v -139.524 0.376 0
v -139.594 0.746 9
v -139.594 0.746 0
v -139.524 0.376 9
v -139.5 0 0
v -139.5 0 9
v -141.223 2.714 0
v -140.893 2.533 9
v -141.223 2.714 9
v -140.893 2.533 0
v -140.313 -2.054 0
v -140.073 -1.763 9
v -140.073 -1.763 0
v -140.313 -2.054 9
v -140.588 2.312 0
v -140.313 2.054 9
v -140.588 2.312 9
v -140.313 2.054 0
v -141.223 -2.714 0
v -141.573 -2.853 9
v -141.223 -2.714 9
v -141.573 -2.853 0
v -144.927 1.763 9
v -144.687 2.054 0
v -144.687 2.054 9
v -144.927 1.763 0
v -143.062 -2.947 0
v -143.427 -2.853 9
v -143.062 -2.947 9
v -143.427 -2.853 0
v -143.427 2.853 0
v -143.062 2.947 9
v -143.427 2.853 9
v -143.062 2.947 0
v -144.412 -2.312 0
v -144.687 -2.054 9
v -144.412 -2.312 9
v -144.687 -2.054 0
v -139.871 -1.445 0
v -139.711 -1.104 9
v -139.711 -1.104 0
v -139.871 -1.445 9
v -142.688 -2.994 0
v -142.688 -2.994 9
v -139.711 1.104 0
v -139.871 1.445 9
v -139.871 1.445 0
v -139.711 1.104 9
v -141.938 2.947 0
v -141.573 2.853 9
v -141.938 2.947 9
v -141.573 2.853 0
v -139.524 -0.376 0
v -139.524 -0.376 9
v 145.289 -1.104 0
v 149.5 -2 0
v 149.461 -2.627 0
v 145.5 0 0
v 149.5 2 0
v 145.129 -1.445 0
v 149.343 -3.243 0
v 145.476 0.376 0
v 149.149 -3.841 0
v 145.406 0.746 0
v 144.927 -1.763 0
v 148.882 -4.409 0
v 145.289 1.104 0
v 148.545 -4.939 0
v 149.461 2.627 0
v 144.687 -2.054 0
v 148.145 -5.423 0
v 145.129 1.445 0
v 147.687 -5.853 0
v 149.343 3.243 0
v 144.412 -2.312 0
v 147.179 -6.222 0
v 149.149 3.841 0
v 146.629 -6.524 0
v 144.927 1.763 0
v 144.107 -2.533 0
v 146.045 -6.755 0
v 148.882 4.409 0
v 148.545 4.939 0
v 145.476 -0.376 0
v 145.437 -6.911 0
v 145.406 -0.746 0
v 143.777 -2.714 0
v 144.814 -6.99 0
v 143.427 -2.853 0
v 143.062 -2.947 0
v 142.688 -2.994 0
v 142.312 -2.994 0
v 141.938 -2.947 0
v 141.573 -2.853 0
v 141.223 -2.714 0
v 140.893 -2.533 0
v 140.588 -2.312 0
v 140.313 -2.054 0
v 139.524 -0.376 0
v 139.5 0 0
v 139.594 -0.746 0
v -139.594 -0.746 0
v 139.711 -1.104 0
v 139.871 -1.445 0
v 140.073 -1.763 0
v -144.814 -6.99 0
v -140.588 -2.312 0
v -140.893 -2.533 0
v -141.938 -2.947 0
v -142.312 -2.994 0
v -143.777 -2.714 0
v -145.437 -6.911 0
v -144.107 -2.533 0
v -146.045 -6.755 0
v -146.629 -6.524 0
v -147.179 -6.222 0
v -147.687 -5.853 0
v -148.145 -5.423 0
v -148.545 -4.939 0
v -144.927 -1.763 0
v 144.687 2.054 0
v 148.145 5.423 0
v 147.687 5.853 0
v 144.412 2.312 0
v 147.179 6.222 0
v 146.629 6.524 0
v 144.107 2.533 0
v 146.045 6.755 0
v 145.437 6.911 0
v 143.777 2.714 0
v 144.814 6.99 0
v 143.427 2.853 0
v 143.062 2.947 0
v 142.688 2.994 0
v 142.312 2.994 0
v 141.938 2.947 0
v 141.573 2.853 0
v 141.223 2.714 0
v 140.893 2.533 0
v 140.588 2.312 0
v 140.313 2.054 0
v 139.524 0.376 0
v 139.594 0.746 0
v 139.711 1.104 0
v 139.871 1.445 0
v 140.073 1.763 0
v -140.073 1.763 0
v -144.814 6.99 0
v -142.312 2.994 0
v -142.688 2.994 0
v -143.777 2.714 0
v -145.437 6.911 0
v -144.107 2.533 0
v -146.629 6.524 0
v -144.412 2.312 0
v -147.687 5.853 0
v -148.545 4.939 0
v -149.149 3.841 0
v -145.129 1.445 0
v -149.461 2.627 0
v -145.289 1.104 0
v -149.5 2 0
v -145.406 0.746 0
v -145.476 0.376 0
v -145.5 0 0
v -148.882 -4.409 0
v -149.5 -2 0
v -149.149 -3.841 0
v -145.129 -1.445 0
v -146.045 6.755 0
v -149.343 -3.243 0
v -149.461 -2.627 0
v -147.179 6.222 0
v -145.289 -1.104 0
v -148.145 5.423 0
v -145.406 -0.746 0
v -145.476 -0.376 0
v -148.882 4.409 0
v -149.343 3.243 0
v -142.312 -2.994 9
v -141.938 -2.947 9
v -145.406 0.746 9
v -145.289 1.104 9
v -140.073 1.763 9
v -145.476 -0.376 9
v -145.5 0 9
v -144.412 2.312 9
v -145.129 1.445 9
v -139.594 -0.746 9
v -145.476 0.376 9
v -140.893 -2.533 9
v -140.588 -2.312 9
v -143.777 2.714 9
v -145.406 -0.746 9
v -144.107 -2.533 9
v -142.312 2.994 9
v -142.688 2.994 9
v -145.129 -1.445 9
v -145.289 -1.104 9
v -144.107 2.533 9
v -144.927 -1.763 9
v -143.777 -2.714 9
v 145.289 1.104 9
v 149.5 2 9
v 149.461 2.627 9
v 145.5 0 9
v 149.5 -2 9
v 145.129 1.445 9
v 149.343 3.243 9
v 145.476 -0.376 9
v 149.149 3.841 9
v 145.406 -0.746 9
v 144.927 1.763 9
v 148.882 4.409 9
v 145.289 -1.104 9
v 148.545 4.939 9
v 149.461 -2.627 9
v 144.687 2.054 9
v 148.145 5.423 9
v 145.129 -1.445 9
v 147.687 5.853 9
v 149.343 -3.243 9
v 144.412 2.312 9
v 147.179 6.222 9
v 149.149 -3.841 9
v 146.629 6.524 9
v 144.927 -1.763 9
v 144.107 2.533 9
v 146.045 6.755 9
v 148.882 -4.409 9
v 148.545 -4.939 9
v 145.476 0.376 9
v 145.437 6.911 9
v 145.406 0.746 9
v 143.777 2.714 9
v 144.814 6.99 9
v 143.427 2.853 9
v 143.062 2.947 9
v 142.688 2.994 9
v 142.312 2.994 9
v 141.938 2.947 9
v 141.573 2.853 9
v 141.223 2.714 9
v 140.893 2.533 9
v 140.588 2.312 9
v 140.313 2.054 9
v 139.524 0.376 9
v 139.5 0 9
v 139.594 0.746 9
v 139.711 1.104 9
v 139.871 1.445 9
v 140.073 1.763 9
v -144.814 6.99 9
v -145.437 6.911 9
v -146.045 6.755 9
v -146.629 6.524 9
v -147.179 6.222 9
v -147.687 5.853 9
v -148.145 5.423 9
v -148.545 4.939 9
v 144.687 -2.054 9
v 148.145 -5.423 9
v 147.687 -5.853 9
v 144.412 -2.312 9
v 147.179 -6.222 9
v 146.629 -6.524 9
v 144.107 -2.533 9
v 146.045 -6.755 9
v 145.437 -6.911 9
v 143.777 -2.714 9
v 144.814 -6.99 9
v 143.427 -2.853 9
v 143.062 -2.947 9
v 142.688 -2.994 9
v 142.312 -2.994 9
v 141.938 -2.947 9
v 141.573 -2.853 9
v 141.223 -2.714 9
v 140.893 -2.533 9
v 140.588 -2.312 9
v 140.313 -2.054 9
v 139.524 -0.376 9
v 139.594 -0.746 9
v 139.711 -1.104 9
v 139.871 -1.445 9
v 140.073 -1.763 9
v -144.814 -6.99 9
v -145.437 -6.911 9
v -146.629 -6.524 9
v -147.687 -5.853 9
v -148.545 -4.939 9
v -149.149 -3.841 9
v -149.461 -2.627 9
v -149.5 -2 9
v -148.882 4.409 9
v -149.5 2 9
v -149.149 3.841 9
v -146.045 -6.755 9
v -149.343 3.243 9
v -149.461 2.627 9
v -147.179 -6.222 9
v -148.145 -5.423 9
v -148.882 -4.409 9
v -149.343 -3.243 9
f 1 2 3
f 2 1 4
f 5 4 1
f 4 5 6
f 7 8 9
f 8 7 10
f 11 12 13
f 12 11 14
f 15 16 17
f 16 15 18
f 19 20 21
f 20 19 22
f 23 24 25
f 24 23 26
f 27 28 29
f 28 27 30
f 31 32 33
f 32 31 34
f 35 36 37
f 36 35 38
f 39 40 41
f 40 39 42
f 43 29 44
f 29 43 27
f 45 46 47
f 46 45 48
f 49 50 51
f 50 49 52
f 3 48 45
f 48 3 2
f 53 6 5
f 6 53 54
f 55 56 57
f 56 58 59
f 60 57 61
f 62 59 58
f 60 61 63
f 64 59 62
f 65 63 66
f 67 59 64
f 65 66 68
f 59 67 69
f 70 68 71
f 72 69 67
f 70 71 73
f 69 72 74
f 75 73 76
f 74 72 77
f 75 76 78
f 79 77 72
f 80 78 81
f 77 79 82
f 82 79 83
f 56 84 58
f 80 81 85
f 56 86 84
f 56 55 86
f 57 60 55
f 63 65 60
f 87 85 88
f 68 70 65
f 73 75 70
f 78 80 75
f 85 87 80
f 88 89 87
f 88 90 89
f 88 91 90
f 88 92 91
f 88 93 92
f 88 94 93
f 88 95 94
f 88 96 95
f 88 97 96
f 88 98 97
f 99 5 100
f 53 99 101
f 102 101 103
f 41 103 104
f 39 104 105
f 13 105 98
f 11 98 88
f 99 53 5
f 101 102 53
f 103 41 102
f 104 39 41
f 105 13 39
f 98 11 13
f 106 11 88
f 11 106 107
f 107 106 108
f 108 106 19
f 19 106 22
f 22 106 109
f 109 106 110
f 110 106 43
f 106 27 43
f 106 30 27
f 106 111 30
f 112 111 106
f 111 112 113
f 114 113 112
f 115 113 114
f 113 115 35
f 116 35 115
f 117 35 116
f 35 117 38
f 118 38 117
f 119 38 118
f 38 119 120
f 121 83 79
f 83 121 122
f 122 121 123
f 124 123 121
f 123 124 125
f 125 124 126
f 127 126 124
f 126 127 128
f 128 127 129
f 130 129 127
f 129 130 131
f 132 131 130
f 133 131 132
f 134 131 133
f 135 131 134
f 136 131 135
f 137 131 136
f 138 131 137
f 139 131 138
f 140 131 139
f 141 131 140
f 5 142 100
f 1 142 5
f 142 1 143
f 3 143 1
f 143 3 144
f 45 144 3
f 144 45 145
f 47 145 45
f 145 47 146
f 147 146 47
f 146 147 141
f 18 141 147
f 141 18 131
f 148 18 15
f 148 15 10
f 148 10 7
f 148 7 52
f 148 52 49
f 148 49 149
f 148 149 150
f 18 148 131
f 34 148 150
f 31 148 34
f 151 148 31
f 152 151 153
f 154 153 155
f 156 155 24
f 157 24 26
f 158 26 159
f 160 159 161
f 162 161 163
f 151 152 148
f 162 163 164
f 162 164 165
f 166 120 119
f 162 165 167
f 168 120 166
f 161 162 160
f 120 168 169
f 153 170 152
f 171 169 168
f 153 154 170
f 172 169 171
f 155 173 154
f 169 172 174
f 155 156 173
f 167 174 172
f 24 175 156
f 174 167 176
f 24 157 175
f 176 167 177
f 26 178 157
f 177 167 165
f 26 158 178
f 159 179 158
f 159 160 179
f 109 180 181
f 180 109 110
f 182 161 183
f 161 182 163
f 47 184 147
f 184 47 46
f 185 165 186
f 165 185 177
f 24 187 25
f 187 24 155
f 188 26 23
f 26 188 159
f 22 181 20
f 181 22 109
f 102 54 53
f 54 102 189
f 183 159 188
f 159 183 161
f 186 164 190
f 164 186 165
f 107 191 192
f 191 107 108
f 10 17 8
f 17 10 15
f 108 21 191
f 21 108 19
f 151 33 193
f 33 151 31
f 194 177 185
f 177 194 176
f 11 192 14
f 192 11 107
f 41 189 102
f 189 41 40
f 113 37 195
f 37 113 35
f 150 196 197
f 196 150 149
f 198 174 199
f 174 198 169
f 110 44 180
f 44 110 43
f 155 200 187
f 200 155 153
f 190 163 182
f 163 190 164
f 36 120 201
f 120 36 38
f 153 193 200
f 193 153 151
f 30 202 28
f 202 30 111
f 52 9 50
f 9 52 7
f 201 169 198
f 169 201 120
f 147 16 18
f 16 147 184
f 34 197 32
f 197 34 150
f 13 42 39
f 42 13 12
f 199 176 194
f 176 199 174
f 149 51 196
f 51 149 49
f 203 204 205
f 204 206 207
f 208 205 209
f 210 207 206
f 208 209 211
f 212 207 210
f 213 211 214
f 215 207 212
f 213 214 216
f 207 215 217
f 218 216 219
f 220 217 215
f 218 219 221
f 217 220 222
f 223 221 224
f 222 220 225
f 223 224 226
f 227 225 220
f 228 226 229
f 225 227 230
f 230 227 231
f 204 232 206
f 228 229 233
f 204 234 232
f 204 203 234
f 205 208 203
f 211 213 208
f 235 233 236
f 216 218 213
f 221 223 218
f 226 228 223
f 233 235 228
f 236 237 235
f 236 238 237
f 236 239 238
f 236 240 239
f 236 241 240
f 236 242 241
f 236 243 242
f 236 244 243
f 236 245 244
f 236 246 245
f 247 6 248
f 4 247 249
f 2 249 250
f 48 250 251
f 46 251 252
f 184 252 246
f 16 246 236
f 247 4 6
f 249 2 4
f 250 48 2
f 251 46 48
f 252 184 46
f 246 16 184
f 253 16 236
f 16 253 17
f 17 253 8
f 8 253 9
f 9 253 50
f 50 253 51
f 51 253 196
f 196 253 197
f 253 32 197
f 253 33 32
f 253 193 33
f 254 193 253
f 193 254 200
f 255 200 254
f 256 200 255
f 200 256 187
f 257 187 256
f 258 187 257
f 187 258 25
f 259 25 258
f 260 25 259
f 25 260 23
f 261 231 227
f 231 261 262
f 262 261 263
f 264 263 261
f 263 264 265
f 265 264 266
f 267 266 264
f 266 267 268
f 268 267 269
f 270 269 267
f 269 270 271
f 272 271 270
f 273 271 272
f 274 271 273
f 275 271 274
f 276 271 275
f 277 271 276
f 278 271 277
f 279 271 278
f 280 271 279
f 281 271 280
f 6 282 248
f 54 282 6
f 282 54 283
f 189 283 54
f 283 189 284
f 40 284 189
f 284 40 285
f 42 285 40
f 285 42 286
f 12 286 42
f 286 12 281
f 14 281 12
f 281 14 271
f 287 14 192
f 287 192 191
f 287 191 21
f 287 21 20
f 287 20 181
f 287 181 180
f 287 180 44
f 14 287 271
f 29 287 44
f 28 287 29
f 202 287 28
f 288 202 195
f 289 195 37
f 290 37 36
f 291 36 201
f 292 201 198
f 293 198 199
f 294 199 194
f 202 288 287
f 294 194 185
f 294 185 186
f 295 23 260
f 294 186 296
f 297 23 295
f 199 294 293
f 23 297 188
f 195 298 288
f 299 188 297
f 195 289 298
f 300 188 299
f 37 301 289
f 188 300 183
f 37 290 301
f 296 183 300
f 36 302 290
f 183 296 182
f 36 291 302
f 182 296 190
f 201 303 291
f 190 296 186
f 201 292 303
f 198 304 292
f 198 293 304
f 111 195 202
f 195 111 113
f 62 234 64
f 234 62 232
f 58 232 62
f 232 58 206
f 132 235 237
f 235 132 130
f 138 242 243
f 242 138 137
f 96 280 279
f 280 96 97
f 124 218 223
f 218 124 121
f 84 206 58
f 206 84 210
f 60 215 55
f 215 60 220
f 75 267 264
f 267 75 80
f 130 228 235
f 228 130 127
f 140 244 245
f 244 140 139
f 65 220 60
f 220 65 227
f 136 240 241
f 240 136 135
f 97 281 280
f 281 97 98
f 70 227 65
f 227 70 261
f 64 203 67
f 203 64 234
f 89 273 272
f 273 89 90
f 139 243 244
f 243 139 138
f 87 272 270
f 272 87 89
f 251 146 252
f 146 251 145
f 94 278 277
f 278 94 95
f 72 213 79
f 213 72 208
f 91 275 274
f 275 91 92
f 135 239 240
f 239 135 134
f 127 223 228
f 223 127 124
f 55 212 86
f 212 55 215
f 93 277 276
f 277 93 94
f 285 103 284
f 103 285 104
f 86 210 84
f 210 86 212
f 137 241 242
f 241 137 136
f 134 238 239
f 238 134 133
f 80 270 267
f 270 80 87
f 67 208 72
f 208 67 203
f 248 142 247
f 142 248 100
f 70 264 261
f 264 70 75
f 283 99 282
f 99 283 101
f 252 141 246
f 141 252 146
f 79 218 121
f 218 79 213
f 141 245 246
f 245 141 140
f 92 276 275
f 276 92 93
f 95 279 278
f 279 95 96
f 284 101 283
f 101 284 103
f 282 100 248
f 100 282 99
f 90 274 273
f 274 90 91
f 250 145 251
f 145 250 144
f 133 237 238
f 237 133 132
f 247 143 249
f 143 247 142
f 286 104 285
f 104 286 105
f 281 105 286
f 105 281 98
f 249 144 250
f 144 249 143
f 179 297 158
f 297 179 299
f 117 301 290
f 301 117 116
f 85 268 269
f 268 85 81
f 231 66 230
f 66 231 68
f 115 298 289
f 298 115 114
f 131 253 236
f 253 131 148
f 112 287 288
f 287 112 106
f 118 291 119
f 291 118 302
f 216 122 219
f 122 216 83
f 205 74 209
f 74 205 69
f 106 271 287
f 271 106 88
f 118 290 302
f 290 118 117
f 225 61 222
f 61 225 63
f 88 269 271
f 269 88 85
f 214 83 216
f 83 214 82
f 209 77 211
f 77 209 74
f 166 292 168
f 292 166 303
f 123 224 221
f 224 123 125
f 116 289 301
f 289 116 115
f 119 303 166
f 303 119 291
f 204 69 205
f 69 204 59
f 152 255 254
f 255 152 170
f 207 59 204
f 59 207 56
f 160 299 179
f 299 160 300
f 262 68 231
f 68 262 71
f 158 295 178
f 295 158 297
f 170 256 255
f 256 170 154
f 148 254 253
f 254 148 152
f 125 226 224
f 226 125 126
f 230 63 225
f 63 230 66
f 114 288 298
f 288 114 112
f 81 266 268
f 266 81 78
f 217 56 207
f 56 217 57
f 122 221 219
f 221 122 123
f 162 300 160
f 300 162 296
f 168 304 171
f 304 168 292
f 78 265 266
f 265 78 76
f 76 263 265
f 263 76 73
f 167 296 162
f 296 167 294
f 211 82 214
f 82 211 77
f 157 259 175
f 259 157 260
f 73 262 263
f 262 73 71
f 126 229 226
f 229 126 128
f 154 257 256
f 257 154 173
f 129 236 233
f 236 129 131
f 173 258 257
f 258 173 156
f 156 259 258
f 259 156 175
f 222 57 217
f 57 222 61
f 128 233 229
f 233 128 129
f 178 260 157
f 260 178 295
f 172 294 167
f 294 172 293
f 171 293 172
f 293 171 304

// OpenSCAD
$fn = 50;


difference() {
	union() {
		hull() {
			translate(v = [-144.5000000000, 2.0000000000, 0]) {
				cylinder(h = 9, r = 5);
			}
			translate(v = [144.5000000000, 2.0000000000, 0]) {
				cylinder(h = 9, r = 5);
			}
			translate(v = [-144.5000000000, -2.0000000000, 0]) {
				cylinder(h = 9, r = 5);
			}
			translate(v = [144.5000000000, -2.0000000000, 0]) {
				cylinder(h = 9, r = 5);
			}
		}
	}
	union() {
		translate(v = [-142.5000000000, 0.0000000000, 0]) {
			cylinder(h = 9, r = 3.0000000000);
		}
		translate(v = [142.5000000000, 0.0000000000, 0]) {
			cylinder(h = 9, r = 3.0000000000);
		}
		translate(v = [-142.5000000000, 0.0000000000, 0]) {
			cylinder(h = 9, r = 1.5000000000);
		}
		translate(v = [142.5000000000, 0.0000000000, 0]) {
			cylinder(h = 9, r = 1.5000000000);
		}
		translate(v = [-142.5000000000, 0.0000000000, 0]) {
			cylinder(h = 9, r = 1.5000000000);
		}
		translate(v = [142.5000000000, 0.0000000000, 0]) {
			cylinder(h = 9, r = 1.5000000000);
		}
		translate(v = [-142.5000000000, 0.0000000000, 0]) {
			cylinder(h = 9, r = 1.5000000000);
		}
		translate(v = [142.5000000000, 0.0000000000, 0]) {
			cylinder(h = 9, r = 1.5000000000);
		}
	}
}
